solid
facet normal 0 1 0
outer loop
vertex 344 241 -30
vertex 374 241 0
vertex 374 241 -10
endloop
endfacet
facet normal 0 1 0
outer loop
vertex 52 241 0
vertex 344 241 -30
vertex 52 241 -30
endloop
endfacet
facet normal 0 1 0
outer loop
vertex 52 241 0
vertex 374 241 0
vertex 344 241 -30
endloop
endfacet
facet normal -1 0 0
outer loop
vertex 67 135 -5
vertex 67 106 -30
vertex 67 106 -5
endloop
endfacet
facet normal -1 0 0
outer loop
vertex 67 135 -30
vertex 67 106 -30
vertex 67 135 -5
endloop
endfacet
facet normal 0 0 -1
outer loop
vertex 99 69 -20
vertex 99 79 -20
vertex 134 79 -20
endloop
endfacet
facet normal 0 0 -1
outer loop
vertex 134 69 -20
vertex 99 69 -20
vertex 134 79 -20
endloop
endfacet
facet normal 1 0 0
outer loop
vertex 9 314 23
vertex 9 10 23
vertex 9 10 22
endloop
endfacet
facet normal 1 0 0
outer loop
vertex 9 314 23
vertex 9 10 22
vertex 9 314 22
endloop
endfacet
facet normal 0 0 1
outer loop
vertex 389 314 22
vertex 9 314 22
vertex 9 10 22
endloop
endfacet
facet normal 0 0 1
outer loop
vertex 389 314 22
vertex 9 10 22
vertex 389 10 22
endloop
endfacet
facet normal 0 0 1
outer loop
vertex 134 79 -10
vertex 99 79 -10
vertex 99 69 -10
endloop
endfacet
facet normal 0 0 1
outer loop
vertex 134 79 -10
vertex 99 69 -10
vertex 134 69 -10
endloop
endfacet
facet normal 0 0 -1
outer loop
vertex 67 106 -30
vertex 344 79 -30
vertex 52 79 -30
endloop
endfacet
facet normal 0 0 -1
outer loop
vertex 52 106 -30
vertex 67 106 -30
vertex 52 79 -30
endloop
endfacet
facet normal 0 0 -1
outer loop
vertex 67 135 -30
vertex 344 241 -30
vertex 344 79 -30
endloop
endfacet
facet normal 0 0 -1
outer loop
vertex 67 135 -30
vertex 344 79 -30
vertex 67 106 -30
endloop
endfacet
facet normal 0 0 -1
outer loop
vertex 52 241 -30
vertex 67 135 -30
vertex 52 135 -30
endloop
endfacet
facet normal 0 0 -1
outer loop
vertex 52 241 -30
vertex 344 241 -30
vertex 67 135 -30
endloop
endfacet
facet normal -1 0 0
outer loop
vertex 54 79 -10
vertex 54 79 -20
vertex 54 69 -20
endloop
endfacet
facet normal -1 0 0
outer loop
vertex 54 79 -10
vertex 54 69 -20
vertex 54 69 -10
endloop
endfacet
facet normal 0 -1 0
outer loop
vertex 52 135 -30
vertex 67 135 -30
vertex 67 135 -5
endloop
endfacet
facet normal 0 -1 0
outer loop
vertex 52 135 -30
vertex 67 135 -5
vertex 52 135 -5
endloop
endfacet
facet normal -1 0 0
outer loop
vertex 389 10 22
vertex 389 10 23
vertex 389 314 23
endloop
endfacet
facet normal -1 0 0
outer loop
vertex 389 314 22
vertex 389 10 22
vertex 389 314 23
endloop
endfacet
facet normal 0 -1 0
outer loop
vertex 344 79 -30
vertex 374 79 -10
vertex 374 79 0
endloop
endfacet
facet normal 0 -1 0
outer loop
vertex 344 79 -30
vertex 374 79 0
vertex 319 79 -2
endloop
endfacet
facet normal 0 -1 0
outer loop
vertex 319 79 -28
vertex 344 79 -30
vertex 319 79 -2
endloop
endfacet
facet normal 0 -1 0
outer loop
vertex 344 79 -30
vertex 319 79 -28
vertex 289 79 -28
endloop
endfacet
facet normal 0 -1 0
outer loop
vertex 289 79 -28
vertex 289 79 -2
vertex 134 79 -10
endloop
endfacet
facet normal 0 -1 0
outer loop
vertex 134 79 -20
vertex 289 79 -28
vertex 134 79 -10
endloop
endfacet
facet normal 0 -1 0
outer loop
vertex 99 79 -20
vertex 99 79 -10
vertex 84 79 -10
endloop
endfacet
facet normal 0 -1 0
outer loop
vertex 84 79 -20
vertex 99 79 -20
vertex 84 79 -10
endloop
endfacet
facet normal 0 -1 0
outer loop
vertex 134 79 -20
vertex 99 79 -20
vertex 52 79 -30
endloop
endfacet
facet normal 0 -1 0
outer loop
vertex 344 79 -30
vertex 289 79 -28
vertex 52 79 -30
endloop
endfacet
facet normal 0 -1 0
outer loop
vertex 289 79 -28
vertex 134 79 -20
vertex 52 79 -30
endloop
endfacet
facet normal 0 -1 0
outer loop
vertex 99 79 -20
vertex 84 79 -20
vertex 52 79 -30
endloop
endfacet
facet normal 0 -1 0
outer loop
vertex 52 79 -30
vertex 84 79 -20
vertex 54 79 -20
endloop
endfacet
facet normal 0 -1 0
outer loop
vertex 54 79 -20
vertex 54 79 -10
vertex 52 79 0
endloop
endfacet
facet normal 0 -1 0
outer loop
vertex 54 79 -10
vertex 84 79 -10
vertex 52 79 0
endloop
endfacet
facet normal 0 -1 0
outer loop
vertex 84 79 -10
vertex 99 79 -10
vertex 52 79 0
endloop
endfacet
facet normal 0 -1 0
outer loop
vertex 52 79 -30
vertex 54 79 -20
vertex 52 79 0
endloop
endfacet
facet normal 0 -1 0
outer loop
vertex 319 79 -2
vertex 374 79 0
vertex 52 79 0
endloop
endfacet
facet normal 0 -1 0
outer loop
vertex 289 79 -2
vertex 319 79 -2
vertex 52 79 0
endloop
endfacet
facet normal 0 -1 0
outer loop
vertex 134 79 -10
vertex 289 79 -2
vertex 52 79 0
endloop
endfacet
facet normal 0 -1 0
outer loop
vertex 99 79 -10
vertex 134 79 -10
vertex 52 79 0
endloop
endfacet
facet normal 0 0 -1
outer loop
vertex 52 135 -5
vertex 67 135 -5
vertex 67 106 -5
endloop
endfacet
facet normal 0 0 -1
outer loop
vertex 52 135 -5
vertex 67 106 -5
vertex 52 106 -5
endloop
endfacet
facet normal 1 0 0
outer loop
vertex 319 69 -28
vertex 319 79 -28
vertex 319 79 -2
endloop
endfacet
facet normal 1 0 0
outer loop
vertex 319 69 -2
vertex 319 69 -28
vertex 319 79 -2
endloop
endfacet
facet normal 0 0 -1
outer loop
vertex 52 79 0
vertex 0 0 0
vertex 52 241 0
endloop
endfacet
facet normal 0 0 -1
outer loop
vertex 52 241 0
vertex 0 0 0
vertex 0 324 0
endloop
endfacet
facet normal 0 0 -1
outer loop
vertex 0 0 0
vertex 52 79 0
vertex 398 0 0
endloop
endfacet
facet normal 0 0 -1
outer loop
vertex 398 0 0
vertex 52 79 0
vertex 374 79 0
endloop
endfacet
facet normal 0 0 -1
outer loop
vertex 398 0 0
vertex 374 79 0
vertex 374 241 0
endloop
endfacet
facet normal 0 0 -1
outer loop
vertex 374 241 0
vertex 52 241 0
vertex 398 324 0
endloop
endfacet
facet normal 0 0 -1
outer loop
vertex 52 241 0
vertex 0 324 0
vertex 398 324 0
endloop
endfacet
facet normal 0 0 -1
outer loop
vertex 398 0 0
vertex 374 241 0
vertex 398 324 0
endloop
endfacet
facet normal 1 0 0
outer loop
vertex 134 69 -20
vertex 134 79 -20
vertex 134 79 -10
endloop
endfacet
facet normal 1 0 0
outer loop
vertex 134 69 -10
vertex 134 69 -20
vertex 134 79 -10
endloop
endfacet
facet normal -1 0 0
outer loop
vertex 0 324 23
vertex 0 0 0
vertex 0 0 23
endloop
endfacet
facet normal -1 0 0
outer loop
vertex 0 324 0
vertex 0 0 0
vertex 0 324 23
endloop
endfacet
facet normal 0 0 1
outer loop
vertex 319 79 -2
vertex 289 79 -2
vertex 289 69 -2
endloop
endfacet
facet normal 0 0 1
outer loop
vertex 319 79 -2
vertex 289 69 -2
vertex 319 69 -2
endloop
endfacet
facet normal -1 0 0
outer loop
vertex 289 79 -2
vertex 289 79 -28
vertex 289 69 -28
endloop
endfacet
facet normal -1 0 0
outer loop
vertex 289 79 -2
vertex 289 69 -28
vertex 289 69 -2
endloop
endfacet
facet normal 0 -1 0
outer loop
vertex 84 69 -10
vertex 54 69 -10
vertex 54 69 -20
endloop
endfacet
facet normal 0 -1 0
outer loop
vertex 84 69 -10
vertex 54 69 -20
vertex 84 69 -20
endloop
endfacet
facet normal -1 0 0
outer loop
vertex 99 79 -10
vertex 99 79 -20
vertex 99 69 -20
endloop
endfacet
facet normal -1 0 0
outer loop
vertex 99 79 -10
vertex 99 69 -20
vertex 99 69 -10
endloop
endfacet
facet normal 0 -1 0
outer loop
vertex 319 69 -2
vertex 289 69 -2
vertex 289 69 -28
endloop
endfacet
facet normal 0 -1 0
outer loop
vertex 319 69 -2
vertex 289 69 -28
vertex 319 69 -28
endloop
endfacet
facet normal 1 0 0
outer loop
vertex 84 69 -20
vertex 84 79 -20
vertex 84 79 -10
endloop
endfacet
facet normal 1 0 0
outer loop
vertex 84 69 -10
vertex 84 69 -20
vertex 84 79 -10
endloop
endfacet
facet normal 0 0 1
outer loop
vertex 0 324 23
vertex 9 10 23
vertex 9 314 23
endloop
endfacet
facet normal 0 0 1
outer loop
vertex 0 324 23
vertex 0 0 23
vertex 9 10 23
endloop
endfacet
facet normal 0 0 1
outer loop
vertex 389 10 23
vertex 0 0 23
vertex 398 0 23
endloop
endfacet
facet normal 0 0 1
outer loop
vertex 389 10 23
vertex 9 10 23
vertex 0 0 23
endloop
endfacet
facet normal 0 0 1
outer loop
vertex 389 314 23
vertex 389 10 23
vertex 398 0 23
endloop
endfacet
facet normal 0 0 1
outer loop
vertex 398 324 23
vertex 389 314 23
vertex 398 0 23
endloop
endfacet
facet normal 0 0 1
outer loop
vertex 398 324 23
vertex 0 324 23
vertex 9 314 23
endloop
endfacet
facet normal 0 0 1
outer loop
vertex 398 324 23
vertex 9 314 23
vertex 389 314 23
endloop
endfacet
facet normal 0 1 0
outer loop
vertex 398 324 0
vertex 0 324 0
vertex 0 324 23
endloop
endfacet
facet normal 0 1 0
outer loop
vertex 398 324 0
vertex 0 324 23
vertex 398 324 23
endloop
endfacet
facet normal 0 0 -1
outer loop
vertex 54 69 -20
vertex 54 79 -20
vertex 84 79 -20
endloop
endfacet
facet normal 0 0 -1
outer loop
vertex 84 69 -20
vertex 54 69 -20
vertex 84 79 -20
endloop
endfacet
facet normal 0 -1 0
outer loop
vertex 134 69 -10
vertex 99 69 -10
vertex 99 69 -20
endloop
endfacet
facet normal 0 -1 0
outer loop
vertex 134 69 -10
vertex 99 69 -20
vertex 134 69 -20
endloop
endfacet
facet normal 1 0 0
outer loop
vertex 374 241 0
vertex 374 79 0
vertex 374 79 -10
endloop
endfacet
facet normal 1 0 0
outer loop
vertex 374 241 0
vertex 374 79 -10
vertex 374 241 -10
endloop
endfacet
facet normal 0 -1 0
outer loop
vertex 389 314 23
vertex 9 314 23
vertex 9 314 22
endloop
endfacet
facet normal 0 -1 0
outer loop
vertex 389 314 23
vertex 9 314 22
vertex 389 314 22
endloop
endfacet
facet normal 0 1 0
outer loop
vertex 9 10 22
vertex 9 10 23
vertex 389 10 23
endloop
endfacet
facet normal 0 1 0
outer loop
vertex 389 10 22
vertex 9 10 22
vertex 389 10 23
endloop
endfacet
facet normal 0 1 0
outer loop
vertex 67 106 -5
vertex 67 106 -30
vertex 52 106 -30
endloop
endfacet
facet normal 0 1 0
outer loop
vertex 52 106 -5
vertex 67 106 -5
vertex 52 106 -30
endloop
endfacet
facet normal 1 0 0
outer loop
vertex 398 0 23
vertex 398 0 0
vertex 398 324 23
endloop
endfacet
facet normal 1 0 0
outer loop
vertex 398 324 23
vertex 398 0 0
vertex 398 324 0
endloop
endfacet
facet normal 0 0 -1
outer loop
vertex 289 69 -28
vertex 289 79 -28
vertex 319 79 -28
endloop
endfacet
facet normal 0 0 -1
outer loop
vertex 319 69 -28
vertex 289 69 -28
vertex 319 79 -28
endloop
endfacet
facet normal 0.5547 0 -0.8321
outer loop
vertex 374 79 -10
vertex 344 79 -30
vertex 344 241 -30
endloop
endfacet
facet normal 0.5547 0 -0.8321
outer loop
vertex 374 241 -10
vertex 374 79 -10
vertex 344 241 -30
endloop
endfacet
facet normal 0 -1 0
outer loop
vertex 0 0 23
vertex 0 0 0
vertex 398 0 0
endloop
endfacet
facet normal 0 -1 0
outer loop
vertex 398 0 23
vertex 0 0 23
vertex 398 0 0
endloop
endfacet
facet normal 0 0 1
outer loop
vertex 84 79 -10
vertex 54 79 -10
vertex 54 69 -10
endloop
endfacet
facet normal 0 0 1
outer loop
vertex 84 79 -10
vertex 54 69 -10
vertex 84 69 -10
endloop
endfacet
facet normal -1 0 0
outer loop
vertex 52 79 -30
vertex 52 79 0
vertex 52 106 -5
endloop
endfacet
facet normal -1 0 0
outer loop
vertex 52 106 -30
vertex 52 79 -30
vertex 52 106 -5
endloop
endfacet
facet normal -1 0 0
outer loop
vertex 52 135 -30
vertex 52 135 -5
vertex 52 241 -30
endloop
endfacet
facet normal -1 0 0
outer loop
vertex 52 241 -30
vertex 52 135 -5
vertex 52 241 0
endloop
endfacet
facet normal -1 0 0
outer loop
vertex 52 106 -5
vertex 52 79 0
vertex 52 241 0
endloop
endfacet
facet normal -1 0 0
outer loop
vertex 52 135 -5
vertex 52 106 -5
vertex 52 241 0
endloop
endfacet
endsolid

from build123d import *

# Parameters (mm, degrees)
SKETCH1_W           = 398
SKETCH1_H           = 324
BOSS_EXTRUDE1_DEPTH = 23
SKETCH2_W           = 380
SKETCH2_H           = 304
CUT_EXTRUDE1_DEPTH  = 1
SKETCH3_W           = 322
SKETCH3_H           = 162
BOSS_EXTRUDE2_DEPTH = 30
CHAMFER1_SIZE       = 20
CHAMFER1_SIZE2      = 30
SKETCH4_W           = 30
SKETCH4_H           = 10
SKETCH4_W_2         = 35
SKETCH4_H_2         = 26
BOSS_EXTRUDE3_DEPTH = 10
SKETCH5_W           = 15
SKETCH5_H           = 29
CUT_EXTRUDE2_DEPTH  = 25


with BuildPart() as part:
    # Sketch1 → Boss-Extrude1 (new body)
    with BuildSketch(Plane.XY):
        with Locations((199, 162)):
            Rectangle(SKETCH1_W, SKETCH1_H)
    extrude(amount=BOSS_EXTRUDE1_DEPTH)

    # Sketch2 → Cut-Extrude1 (cut)
    with BuildSketch(Plane.XY.offset(23)):
        with Locations((199, 162)):
            Rectangle(SKETCH2_W, SKETCH2_H)
    extrude(amount=-CUT_EXTRUDE1_DEPTH, mode=Mode.SUBTRACT)

    # Sketch3 → Boss-Extrude2 (add)
    with BuildSketch(Plane(origin=(0, 0, 0), x_dir=(-1, 0, 0), z_dir=(0, 0, -1))):
        with Locations((-213, 160)):
            Rectangle(SKETCH3_W, SKETCH3_H)
    extrude(amount=BOSS_EXTRUDE2_DEPTH)

    # Chamfer1
    chamfer1_edges = [part.edges().sort_by_distance(p)[0] for p in [
        (374, 160, -30),
    ]]
    chamfer1_side = [part.faces().sort_by_distance(p)[0] for p in [
        (374, 160, -15),
    ]]
    chamfer(chamfer1_edges, length=CHAMFER1_SIZE, length2=CHAMFER1_SIZE2, reference=chamfer1_side[0])

    # Sketch4 → Boss-Extrude3 (add)
    with BuildSketch(Plane.XZ.offset(-79)):
        with Locations((69, -15)):
            Rectangle(SKETCH4_W, SKETCH4_H)
        with Locations((116.5, -15)):
            Rectangle(SKETCH4_W_2, SKETCH4_H)
        with Locations((304, -15)):
            Rectangle(SKETCH4_W, SKETCH4_H_2)
    extrude(amount=BOSS_EXTRUDE3_DEPTH)

    # Sketch5 → Cut-Extrude2 (cut)
    with BuildSketch(Plane(origin=(0, 0, -30), x_dir=(-1, 0, 0), z_dir=(0, 0, -1))):
        with Locations((-59.5, 120.5)):
            Rectangle(SKETCH5_W, SKETCH5_H)
    extrude(amount=-CUT_EXTRUDE2_DEPTH, mode=Mode.SUBTRACT)


solid = part.part
